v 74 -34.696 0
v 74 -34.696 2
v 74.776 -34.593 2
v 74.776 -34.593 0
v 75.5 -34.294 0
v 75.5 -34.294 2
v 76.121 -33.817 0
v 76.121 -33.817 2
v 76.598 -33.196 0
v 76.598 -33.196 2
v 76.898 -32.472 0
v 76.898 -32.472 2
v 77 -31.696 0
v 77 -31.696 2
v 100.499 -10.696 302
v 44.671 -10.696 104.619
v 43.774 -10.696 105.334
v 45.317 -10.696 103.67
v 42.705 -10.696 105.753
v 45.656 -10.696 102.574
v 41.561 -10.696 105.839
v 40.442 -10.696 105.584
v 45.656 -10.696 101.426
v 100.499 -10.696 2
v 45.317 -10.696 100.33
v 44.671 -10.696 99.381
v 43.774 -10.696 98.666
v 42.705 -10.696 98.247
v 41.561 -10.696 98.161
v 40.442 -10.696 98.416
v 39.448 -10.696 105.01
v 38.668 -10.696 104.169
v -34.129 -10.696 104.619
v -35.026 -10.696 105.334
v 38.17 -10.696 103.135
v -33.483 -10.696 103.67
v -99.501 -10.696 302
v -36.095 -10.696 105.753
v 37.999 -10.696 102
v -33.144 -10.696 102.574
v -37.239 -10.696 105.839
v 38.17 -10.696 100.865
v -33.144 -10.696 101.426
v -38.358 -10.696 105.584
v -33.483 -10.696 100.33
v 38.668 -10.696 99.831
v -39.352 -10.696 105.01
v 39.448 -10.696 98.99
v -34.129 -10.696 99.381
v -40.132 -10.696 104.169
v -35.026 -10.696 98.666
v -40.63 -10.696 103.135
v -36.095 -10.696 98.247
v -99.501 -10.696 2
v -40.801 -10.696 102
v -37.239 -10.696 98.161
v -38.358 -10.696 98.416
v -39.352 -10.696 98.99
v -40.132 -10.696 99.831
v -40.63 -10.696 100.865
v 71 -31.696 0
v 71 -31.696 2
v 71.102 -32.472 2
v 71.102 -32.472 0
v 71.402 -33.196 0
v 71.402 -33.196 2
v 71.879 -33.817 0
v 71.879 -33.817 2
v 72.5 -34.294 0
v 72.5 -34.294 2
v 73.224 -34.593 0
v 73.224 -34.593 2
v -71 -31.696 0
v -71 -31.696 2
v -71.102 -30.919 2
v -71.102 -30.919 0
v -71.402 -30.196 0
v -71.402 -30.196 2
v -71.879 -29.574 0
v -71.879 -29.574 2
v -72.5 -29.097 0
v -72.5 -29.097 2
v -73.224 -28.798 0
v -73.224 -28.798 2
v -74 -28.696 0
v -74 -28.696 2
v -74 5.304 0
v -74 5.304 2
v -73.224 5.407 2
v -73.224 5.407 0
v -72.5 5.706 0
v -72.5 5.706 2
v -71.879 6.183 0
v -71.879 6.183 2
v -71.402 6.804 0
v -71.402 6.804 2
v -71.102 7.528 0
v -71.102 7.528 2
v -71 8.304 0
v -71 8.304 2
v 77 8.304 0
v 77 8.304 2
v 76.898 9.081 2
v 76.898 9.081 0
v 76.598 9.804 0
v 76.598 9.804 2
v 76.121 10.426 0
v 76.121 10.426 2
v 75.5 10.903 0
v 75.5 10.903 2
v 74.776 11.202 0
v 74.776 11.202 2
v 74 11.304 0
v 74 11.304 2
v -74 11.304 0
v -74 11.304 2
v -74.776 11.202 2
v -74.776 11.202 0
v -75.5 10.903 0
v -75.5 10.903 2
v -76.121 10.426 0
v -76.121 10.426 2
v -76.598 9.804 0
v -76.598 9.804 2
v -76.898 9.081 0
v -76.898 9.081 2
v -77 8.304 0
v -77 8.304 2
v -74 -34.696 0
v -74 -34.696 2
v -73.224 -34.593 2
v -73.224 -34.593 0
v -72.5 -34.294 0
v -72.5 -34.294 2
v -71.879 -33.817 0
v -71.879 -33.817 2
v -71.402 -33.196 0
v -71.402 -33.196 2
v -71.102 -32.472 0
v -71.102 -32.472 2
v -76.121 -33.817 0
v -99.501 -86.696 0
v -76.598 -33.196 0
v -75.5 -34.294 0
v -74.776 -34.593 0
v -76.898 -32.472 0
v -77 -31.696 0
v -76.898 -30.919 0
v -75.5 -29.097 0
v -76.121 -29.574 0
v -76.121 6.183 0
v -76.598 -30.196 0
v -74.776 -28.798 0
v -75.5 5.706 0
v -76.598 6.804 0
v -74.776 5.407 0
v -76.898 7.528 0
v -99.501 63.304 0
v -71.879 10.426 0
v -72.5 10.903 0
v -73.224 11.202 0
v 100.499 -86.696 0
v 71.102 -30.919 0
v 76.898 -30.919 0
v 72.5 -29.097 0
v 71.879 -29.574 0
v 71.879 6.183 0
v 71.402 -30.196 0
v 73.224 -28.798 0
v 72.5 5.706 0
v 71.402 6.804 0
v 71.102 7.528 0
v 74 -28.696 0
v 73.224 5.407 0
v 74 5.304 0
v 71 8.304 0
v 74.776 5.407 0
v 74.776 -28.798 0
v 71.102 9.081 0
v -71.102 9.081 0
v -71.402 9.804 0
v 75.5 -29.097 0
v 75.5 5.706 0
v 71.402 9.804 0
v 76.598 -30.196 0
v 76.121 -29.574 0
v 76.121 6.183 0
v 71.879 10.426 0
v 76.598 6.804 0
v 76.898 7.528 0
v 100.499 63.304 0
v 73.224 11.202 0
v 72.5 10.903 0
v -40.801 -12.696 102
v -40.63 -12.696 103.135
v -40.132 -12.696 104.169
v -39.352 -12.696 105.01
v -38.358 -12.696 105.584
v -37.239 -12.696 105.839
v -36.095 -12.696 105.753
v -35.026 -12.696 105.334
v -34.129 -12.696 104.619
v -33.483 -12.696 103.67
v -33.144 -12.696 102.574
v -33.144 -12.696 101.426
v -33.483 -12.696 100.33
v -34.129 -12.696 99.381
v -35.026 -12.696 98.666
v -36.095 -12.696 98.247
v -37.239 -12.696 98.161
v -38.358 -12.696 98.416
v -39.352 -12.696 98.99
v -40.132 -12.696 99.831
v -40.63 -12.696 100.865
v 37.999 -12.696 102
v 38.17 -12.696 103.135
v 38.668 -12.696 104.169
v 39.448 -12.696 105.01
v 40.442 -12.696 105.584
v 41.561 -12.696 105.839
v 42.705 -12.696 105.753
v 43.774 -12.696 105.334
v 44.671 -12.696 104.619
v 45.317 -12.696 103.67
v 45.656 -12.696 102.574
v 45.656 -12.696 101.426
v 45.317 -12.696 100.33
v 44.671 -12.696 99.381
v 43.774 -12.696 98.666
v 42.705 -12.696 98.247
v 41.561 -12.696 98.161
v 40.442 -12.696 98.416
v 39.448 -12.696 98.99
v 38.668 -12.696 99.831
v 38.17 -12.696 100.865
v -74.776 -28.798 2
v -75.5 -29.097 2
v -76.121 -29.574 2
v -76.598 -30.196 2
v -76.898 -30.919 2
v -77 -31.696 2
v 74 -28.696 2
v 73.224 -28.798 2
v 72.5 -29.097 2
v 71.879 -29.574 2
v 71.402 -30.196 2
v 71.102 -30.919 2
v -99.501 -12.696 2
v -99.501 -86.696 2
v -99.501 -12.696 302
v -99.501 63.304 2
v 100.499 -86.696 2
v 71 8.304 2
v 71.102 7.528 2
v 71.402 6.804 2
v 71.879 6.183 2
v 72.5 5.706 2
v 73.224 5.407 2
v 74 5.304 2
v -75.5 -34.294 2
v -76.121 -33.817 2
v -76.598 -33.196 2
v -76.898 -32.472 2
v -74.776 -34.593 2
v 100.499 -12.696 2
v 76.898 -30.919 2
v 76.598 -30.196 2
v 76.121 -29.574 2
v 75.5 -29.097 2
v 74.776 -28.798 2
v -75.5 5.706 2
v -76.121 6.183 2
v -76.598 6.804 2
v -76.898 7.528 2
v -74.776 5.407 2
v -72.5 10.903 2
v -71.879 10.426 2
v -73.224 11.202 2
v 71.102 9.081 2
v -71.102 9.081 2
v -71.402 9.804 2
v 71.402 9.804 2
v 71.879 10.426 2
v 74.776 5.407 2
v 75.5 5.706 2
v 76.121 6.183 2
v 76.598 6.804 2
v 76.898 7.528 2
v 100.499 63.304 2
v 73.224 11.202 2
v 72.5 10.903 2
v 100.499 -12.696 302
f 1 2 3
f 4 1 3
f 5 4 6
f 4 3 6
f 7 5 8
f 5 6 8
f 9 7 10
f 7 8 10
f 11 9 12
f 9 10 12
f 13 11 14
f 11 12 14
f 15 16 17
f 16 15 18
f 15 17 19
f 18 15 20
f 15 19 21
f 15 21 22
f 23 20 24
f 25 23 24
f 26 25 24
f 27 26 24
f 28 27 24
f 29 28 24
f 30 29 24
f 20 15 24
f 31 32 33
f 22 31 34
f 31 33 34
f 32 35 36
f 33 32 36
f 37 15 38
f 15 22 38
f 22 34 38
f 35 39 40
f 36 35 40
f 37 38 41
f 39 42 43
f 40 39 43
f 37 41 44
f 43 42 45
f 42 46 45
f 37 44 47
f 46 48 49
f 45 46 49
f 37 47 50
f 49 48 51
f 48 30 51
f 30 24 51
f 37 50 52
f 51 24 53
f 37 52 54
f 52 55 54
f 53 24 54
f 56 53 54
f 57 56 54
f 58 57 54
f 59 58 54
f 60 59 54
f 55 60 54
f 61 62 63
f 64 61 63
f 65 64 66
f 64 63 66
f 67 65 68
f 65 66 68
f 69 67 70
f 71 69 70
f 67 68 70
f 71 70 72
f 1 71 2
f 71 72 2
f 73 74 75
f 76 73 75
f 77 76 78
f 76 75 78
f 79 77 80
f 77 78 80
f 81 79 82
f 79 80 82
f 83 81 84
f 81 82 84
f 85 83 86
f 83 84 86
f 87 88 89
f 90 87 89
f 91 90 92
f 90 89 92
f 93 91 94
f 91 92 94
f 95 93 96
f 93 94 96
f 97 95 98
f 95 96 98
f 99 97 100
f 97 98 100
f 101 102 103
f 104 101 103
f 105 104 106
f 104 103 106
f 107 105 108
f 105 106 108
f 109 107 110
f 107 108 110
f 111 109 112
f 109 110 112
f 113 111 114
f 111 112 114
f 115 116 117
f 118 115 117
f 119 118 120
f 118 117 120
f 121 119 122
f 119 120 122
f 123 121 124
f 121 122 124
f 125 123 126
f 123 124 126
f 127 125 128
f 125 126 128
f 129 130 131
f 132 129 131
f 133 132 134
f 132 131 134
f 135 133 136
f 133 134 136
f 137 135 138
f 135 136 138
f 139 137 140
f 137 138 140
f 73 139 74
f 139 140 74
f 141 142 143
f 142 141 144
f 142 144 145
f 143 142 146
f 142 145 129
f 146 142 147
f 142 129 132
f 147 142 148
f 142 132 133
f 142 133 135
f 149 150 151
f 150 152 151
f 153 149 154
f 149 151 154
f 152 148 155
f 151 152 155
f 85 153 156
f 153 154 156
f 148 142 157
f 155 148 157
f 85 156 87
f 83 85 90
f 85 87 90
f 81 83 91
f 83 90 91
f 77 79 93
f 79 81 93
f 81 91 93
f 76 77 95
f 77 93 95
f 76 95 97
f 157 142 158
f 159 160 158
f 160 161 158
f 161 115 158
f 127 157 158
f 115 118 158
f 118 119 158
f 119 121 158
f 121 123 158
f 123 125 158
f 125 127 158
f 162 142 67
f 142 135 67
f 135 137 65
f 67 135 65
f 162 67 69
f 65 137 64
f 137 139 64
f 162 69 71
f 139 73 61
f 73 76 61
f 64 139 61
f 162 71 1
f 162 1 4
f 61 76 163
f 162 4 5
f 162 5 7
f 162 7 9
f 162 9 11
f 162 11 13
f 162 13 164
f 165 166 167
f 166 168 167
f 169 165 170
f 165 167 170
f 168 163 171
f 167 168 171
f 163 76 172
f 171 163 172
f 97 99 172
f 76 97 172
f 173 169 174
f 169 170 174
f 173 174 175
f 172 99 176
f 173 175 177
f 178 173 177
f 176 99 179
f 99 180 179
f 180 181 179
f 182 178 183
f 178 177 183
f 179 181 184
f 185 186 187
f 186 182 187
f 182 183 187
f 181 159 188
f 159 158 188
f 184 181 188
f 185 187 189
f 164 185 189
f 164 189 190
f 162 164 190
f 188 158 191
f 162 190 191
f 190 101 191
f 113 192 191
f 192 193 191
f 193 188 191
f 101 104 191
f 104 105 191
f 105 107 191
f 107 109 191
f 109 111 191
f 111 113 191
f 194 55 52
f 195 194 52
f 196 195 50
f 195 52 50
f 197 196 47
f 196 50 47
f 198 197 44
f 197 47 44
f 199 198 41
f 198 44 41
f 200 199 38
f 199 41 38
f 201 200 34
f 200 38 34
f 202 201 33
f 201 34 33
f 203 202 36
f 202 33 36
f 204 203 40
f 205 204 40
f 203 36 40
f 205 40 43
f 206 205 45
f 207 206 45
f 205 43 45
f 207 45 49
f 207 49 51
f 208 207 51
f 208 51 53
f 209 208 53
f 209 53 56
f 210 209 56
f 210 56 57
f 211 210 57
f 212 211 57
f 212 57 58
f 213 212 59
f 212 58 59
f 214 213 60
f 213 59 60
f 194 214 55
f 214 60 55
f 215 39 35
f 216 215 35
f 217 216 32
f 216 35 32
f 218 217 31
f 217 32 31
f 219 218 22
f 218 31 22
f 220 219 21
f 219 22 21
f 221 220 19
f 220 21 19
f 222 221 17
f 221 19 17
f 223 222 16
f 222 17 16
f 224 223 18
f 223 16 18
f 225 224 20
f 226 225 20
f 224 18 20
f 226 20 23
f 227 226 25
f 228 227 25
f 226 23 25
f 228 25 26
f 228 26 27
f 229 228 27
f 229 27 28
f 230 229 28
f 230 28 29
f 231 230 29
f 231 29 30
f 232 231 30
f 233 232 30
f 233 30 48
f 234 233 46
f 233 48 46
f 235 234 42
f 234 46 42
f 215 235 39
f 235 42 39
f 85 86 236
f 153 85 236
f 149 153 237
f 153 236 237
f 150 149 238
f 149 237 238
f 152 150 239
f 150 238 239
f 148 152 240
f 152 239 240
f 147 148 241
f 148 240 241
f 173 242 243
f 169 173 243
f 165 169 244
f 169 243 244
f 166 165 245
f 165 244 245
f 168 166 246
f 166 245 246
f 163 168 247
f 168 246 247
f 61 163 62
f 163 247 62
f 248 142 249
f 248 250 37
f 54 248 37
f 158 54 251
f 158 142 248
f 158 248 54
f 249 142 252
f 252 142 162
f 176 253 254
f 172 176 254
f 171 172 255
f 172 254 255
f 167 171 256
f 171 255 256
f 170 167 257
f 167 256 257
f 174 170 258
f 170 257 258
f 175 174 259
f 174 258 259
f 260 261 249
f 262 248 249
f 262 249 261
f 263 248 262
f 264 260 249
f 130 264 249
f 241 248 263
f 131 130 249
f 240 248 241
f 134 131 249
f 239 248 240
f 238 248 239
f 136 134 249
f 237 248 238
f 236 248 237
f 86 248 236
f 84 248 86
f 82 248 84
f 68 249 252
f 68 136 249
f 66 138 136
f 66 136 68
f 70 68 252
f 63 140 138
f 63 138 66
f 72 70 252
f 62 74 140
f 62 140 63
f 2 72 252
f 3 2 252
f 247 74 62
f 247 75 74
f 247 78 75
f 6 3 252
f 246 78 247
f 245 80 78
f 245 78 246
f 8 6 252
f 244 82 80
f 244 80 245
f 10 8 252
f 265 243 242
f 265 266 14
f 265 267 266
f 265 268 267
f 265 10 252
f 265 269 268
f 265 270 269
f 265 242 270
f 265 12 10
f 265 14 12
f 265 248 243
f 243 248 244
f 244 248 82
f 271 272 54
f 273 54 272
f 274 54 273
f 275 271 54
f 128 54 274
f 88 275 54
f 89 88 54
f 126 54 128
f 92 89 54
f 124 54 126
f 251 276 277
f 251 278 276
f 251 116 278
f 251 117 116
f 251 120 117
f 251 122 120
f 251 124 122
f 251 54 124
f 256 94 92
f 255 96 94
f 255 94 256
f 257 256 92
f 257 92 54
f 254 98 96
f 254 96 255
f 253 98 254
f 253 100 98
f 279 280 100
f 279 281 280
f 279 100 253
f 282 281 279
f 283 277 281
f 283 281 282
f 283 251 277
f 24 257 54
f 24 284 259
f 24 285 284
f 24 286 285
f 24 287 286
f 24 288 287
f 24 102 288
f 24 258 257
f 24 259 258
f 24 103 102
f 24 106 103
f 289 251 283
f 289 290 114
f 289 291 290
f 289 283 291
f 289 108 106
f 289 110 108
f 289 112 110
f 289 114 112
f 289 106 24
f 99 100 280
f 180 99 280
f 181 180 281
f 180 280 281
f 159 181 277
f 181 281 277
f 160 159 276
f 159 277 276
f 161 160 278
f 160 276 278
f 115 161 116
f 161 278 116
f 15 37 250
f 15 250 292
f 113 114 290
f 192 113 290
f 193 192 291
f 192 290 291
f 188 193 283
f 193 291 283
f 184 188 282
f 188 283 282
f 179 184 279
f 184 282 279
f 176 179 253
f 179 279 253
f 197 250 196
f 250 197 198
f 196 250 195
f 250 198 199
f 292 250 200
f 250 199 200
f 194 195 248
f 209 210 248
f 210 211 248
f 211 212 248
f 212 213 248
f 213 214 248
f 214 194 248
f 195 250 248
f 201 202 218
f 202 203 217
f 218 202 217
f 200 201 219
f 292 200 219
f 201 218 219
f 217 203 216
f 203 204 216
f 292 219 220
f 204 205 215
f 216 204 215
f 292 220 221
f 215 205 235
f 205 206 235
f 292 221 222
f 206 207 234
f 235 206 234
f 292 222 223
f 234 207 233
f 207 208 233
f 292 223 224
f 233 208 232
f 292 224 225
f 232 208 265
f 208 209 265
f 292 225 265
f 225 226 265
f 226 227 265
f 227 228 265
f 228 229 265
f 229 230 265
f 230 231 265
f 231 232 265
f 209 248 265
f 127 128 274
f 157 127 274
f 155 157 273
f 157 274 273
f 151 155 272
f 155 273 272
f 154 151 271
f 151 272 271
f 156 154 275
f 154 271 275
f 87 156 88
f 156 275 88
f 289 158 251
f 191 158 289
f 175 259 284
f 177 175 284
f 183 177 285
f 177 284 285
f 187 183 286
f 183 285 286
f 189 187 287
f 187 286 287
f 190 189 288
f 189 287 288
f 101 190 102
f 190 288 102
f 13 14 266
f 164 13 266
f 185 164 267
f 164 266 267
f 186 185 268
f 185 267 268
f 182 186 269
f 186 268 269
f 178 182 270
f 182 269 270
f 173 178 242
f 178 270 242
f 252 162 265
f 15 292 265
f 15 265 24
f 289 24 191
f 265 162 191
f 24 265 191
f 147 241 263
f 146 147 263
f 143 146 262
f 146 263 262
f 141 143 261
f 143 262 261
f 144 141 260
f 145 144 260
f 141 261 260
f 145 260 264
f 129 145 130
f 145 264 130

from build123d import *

# Parameters (mm, degrees)
F0_W     = 200
F0_H     = 150
F1_DEPTH = 2
F2_W     = 148
F2_H     = 2
F2_W_2   = 25.5013404053
F3_DEPTH = 300
F5_DEPTH = 2.001
F6_R     = 3.85
F7_DEPTH = 2


with BuildPart() as f1:
    # F0 (on Top) → F1 (new body)
    with BuildSketch(Plane.XY):
        with Locations((0.4986595947, -11.6955466568)):
            Rectangle(F0_W, F0_H)
    extrude(amount=F1_DEPTH)

    # F2 (on face) → F3 (join)
    with BuildSketch(Plane.XY.offset(2)):
        with Locations((0, -11.6955466568)):
            Rectangle(F2_W, F2_H)
        Polygon((100.4986595947, -10.6955466568), (74, -10.6955466568), (74, -12.6955466568), (100.4986595947, -12.6955466568), (100.4986595947, -11.6955466568), align=None)
        with Locations((-86.7506702027, -11.6955466568)):
            Rectangle(F2_W_2, F2_H)
    extrude(amount=F3_DEPTH)

    # F2 (on face) → F5 (cut, through all)
    with BuildSketch(Plane.XY.offset(2)):
        with BuildLine():
            Line((-71, -31.6955466568), (-74, -31.6955466568))
            Line((-74, -31.6955466568), (-74, -34.6955466568))
            ThreePointArc((-74, -34.6955466568), (-71.8786796564, -33.8168670004), (-71, -31.6955466568))
        make_face()
        with BuildLine():
            ThreePointArc((-71, -31.6955466568), (-71.8786796564, -29.5742263133), (-74, -28.6955466568))
            Line((-74, -28.6955466568), (-74, -31.6955466568))
            Line((-74, -31.6955466568), (-71, -31.6955466568))
        make_face()
        with BuildLine():
            ThreePointArc((-74, -28.6955466568), (-76.1213203436, -29.5742263133), (-77, -31.6955466568))
            Line((-77, -31.6955466568), (-74, -31.6955466568))
            Line((-74, -31.6955466568), (-74, -28.6955466568))
        make_face()
        with BuildLine():
            Line((-74, -31.6955466568), (-77, -31.6955466568))
            ThreePointArc((-77, -31.6955466568), (-76.1213203436, -33.8168670004), (-74, -34.6955466568))
            Line((-74, -34.6955466568), (-74, -31.6955466568))
        make_face()
        with BuildLine():
            Line((74, -31.6955466568), (74, -28.6955466568))
            ThreePointArc((74, -28.6955466568), (71.8786796564, -29.5742263133), (71, -31.6955466568))
            Line((71, -31.6955466568), (74, -31.6955466568))
        make_face()
        with BuildLine():
            Line((74, -31.6955466568), (71, -31.6955466568))
            ThreePointArc((71, -31.6955466568), (71.8786796564, -33.8168670004), (74, -34.6955466568))
            Line((74, -34.6955466568), (74, -31.6955466568))
        make_face()
        with BuildLine():
            Line((77, -31.6955466568), (74, -31.6955466568))
            Line((74, -31.6955466568), (74, -34.6955466568))
            ThreePointArc((74, -34.6955466568), (76.1213203436, -33.8168670004), (77, -31.6955466568))
        make_face()
        with BuildLine():
            ThreePointArc((77, -31.6955466568), (76.1213203436, -29.5742263133), (74, -28.6955466568))
            Line((74, -28.6955466568), (74, -31.6955466568))
            Line((74, -31.6955466568), (77, -31.6955466568))
        make_face()
        with BuildLine():
            ThreePointArc((-71, 8.3044533432), (-71.8786796564, 10.4257736867), (-74, 11.3044533432))
            Line((-74, 11.3044533432), (-74, 8.3044533432))
            Line((-74, 8.3044533432), (-71, 8.3044533432))
        make_face()
        with BuildLine():
            Line((-71, 8.3044533432), (-74, 8.3044533432))
            Line((-74, 8.3044533432), (-74, 5.3044533432))
            ThreePointArc((-74, 5.3044533432), (-71.8786796564, 6.1831329996), (-71, 8.3044533432))
        make_face()
        with BuildLine():
            Line((-74, 8.3044533432), (-77, 8.3044533432))
            ThreePointArc((-77, 8.3044533432), (-76.1213203436, 6.1831329996), (-74, 5.3044533432))
            Line((-74, 5.3044533432), (-74, 8.3044533432))
        make_face()
        with BuildLine():
            ThreePointArc((-74, 11.3044533432), (-76.1213203436, 10.4257736867), (-77, 8.3044533432))
            Line((-77, 8.3044533432), (-74, 8.3044533432))
            Line((-74, 8.3044533432), (-74, 11.3044533432))
        make_face()
        with BuildLine():
            Line((77, 8.3044533432), (74, 8.3044533432))
            Line((74, 8.3044533432), (74, 5.3044533432))
            ThreePointArc((74, 5.3044533432), (76.1213203436, 6.1831329996), (77, 8.3044533432))
        make_face()
        with BuildLine():
            ThreePointArc((77, 8.3044533432), (76.1213203436, 10.4257736867), (74, 11.3044533432))
            Line((74, 11.3044533432), (74, 8.3044533432))
            Line((74, 8.3044533432), (77, 8.3044533432))
        make_face()
        with BuildLine():
            Line((74, 8.3044533432), (74, 11.3044533432))
            ThreePointArc((74, 11.3044533432), (71.8786796564, 10.4257736867), (71, 8.3044533432))
            Line((71, 8.3044533432), (74, 8.3044533432))
        make_face()
        with BuildLine():
            Line((74, 5.3044533432), (74, 8.3044533432))
            Line((74, 8.3044533432), (71, 8.3044533432))
            ThreePointArc((71, 8.3044533432), (71.8786796564, 6.1831329996), (74, 5.3044533432))
        make_face()
    extrude(amount=-F5_DEPTH, mode=Mode.SUBTRACT)

    # F6 (on face) → F7 (cut)
    with BuildSketch(Plane(origin=(0, -10.6955466568, 0), x_dir=(-1, 0, 0), z_dir=(0, 1, 0))):
        with Locations((-41.8486595947, 102)):
            Circle(F6_R)
        with Locations((36.9513404053, 102)):
            Circle(F6_R)
    extrude(amount=-F7_DEPTH, mode=Mode.SUBTRACT)


solid = f1.part
